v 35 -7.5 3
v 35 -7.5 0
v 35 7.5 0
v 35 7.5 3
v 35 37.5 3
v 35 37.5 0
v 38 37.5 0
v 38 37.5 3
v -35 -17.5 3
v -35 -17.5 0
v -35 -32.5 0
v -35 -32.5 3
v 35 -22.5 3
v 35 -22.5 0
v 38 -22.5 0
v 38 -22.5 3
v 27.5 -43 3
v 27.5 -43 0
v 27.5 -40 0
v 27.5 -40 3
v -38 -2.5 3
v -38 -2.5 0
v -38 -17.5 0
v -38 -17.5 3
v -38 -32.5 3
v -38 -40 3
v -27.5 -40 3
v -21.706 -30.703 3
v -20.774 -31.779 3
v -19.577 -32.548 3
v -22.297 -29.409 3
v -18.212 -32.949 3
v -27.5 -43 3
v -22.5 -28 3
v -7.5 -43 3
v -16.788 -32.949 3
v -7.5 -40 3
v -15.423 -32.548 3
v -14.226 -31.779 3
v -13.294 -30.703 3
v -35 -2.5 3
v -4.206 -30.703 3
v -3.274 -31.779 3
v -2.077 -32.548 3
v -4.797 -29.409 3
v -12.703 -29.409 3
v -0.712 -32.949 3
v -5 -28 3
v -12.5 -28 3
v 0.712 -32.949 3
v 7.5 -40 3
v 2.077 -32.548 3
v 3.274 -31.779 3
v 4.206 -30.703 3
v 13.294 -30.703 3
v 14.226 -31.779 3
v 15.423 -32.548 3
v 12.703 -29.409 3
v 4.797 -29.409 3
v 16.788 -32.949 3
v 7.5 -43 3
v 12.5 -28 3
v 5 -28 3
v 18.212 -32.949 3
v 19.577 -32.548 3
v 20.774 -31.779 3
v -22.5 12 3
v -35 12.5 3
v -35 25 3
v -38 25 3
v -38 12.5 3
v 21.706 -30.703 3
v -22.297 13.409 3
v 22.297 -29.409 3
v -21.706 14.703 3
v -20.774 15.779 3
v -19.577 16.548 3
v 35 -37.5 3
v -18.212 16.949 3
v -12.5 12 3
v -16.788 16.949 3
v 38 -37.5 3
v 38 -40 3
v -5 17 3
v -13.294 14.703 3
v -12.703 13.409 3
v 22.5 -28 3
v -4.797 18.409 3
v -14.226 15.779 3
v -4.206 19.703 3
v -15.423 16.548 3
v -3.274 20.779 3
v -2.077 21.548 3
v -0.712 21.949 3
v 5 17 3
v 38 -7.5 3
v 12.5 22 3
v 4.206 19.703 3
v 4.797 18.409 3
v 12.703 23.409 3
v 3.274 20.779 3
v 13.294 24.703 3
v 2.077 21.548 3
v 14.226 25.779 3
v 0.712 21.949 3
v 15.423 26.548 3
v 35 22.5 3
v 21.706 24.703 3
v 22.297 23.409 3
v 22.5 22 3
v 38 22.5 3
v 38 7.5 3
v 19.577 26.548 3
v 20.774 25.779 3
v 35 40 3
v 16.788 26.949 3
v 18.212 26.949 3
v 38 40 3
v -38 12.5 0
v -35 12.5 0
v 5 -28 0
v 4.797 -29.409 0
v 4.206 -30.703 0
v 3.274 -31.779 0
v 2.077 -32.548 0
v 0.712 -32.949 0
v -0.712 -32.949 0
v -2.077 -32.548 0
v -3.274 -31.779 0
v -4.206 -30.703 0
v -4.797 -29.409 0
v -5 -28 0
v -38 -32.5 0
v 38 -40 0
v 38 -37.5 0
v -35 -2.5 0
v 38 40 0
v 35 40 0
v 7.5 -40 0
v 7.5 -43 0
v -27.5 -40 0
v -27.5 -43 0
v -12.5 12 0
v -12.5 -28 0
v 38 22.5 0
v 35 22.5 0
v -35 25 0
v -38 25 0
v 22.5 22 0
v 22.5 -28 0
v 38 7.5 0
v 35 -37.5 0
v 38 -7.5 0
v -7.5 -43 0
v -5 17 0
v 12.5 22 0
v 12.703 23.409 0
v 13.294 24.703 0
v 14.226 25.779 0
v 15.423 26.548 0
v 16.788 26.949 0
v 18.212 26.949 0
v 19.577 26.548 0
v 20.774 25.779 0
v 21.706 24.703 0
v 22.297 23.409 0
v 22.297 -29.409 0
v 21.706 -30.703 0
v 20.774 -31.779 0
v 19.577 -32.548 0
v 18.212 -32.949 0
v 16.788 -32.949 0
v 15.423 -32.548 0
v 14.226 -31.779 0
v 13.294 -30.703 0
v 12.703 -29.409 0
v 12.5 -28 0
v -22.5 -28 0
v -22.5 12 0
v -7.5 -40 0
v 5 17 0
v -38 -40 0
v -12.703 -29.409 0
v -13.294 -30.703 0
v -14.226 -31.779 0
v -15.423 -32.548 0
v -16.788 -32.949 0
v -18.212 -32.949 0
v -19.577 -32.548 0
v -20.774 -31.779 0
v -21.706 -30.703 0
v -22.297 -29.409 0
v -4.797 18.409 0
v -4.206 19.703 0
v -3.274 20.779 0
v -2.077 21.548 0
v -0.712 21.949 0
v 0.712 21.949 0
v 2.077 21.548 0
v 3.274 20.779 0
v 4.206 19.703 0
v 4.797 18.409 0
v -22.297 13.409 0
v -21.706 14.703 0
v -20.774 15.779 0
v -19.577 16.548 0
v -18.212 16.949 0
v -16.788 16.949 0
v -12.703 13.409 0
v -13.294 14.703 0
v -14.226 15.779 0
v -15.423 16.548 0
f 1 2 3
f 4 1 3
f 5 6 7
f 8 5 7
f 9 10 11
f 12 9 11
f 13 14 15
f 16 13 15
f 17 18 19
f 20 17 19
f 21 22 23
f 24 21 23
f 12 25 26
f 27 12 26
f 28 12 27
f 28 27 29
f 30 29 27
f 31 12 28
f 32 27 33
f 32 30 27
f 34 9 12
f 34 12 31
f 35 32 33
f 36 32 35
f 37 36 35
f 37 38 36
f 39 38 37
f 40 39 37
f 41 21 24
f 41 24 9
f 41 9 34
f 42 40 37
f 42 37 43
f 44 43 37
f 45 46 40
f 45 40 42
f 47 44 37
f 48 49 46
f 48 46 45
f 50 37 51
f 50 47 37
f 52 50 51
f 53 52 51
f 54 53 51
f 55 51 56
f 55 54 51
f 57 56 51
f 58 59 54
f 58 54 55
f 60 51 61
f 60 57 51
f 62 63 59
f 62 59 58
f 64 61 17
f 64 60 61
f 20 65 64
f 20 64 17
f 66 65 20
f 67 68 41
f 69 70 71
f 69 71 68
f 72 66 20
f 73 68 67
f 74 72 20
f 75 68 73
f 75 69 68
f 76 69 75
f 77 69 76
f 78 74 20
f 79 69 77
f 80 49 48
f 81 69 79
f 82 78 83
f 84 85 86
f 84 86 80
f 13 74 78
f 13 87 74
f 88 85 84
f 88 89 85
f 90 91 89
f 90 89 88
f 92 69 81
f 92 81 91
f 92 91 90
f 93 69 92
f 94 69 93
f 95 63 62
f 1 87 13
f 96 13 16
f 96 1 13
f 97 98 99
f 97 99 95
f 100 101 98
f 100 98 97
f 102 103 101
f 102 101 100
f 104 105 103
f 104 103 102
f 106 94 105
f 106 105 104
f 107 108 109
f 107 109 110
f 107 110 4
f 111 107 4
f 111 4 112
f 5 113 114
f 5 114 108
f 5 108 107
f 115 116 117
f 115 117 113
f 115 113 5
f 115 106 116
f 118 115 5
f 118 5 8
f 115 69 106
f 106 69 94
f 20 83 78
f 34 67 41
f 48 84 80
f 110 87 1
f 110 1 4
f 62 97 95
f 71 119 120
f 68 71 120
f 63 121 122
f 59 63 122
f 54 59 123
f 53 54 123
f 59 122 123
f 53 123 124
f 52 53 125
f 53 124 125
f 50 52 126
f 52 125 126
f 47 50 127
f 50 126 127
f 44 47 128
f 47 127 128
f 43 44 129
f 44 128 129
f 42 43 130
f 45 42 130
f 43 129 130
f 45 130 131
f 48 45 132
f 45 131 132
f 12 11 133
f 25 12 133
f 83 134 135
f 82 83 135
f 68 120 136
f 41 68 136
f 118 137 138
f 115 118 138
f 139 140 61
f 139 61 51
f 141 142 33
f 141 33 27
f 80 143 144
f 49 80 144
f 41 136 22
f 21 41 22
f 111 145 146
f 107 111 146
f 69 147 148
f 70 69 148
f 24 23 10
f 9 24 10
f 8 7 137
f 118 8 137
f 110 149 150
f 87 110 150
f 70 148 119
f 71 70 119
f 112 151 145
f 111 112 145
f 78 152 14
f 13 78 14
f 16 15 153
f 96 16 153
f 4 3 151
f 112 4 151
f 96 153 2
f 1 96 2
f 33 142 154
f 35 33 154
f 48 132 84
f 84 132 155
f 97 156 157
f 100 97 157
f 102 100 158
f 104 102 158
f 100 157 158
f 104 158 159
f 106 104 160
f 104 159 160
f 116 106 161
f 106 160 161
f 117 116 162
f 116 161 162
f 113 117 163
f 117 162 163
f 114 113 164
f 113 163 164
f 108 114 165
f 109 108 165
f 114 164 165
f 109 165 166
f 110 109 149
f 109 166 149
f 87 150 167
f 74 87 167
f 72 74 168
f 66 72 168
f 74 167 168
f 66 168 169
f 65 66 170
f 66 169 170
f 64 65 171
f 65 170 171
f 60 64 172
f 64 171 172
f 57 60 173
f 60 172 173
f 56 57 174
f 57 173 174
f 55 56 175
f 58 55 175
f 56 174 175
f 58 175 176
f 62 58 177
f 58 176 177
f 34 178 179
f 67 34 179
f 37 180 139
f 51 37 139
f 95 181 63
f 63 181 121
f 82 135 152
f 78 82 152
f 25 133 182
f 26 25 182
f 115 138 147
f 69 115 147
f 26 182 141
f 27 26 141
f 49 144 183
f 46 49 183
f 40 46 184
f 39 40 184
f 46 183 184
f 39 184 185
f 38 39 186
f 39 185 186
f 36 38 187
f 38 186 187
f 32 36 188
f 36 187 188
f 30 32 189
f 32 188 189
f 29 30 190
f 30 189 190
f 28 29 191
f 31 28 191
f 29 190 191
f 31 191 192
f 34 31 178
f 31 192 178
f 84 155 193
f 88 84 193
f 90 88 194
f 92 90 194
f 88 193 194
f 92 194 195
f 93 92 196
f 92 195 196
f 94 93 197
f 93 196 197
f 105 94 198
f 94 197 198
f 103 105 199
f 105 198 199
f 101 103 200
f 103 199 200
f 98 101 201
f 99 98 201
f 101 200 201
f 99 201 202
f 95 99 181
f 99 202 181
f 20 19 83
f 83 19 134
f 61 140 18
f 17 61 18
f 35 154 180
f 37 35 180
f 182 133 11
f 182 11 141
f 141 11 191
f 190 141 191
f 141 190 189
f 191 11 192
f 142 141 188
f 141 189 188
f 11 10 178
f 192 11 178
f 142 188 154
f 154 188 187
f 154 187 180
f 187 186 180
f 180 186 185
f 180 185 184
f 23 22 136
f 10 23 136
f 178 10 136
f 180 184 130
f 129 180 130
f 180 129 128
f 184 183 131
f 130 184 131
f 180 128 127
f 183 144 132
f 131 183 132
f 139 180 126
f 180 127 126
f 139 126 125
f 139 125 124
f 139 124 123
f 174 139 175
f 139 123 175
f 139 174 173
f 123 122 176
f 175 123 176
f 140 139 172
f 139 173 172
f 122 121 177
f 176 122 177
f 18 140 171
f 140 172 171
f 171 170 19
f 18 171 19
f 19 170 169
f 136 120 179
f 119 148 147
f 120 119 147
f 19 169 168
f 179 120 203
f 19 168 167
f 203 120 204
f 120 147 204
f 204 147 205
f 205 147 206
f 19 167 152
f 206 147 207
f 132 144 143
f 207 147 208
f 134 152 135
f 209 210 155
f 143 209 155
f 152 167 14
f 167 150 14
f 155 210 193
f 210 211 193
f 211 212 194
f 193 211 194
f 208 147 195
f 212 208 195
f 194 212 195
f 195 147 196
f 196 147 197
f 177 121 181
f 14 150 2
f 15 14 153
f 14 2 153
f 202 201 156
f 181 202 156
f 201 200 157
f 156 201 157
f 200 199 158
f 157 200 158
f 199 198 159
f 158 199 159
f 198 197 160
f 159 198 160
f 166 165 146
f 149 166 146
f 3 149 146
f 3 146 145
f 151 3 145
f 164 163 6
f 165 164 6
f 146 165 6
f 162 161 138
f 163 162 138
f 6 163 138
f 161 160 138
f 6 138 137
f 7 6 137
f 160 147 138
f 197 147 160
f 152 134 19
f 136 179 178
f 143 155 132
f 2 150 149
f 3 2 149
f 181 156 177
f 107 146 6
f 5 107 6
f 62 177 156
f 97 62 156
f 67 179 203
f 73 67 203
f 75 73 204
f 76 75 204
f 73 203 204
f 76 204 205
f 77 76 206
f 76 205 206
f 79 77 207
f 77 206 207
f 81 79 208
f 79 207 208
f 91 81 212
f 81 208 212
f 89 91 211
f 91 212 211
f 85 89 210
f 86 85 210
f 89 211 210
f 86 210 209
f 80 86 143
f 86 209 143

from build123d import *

# Parameters (mm, degrees)
SKETCH1_W           = 20
SKETCH1_H           = 3
BOSS_EXTRUDE1_DEPTH = 3


with BuildPart() as part:
    # Sketch1 → Boss-Extrude1 (new body)
    # profile 1 of 3: a face of its own
    with BuildSketch(Plane.XY):
        Polygon((35, 40), (-35, 25), (-38, 25), (-38, 12.5), (-35, 12.5), (-35, -2.5), (-38, -2.5), (-38, -17.5), (-35, -17.5), (-35, -32.5), (-38, -32.5), (-38, -40), (-27.5, -40), (-7.5, -40), (7.5, -40), (27.5, -40), (38, -40), (38, -37.5), (35, -37.5), (35, -22.5), (38, -22.5), (38, -7.5), (35, -7.5), (35, 7.5), (38, 7.5), (38, 22.5), (35, 22.5), (35, 37.5), (38, 37.5), (38, 40), align=None)
        with BuildLine():
            ThreePointArc((-12.5, -28), (-17.5, -33), (-22.5, -28))
            Line((-22.5, -28), (-22.5, 12))
            ThreePointArc((-22.5, 12), (-17.5, 17), (-12.5, 12))
            Line((-12.5, 12), (-12.5, -28))
        make_face(mode=Mode.SUBTRACT)
        with BuildLine():
            ThreePointArc((-5, 17), (0, 22), (5, 17))
            Line((5, 17), (5, -28))
            ThreePointArc((5, -28), (0, -33), (-5, -28))
            Line((-5, -28), (-5, 17))
        make_face(mode=Mode.SUBTRACT)
        with BuildLine():
            ThreePointArc((22.5, -28), (17.5, -33), (12.5, -28))
            Line((12.5, -28), (12.5, 22))
            ThreePointArc((12.5, 22), (17.5, 27), (22.5, 22))
            Line((22.5, 22), (22.5, -28))
        make_face(mode=Mode.SUBTRACT)
    # profile 2 of 3: a face of its own
    with BuildSketch(Plane.XY):
        with Locations((17.5, -41.5)):
            Rectangle(SKETCH1_W, SKETCH1_H)
    # profile 3 of 3: a face of its own
    with BuildSketch(Plane.XY):
        with Locations((-17.5, -41.5)):
            Rectangle(SKETCH1_W, SKETCH1_H)
    extrude(amount=BOSS_EXTRUDE1_DEPTH)


solid = part.part
